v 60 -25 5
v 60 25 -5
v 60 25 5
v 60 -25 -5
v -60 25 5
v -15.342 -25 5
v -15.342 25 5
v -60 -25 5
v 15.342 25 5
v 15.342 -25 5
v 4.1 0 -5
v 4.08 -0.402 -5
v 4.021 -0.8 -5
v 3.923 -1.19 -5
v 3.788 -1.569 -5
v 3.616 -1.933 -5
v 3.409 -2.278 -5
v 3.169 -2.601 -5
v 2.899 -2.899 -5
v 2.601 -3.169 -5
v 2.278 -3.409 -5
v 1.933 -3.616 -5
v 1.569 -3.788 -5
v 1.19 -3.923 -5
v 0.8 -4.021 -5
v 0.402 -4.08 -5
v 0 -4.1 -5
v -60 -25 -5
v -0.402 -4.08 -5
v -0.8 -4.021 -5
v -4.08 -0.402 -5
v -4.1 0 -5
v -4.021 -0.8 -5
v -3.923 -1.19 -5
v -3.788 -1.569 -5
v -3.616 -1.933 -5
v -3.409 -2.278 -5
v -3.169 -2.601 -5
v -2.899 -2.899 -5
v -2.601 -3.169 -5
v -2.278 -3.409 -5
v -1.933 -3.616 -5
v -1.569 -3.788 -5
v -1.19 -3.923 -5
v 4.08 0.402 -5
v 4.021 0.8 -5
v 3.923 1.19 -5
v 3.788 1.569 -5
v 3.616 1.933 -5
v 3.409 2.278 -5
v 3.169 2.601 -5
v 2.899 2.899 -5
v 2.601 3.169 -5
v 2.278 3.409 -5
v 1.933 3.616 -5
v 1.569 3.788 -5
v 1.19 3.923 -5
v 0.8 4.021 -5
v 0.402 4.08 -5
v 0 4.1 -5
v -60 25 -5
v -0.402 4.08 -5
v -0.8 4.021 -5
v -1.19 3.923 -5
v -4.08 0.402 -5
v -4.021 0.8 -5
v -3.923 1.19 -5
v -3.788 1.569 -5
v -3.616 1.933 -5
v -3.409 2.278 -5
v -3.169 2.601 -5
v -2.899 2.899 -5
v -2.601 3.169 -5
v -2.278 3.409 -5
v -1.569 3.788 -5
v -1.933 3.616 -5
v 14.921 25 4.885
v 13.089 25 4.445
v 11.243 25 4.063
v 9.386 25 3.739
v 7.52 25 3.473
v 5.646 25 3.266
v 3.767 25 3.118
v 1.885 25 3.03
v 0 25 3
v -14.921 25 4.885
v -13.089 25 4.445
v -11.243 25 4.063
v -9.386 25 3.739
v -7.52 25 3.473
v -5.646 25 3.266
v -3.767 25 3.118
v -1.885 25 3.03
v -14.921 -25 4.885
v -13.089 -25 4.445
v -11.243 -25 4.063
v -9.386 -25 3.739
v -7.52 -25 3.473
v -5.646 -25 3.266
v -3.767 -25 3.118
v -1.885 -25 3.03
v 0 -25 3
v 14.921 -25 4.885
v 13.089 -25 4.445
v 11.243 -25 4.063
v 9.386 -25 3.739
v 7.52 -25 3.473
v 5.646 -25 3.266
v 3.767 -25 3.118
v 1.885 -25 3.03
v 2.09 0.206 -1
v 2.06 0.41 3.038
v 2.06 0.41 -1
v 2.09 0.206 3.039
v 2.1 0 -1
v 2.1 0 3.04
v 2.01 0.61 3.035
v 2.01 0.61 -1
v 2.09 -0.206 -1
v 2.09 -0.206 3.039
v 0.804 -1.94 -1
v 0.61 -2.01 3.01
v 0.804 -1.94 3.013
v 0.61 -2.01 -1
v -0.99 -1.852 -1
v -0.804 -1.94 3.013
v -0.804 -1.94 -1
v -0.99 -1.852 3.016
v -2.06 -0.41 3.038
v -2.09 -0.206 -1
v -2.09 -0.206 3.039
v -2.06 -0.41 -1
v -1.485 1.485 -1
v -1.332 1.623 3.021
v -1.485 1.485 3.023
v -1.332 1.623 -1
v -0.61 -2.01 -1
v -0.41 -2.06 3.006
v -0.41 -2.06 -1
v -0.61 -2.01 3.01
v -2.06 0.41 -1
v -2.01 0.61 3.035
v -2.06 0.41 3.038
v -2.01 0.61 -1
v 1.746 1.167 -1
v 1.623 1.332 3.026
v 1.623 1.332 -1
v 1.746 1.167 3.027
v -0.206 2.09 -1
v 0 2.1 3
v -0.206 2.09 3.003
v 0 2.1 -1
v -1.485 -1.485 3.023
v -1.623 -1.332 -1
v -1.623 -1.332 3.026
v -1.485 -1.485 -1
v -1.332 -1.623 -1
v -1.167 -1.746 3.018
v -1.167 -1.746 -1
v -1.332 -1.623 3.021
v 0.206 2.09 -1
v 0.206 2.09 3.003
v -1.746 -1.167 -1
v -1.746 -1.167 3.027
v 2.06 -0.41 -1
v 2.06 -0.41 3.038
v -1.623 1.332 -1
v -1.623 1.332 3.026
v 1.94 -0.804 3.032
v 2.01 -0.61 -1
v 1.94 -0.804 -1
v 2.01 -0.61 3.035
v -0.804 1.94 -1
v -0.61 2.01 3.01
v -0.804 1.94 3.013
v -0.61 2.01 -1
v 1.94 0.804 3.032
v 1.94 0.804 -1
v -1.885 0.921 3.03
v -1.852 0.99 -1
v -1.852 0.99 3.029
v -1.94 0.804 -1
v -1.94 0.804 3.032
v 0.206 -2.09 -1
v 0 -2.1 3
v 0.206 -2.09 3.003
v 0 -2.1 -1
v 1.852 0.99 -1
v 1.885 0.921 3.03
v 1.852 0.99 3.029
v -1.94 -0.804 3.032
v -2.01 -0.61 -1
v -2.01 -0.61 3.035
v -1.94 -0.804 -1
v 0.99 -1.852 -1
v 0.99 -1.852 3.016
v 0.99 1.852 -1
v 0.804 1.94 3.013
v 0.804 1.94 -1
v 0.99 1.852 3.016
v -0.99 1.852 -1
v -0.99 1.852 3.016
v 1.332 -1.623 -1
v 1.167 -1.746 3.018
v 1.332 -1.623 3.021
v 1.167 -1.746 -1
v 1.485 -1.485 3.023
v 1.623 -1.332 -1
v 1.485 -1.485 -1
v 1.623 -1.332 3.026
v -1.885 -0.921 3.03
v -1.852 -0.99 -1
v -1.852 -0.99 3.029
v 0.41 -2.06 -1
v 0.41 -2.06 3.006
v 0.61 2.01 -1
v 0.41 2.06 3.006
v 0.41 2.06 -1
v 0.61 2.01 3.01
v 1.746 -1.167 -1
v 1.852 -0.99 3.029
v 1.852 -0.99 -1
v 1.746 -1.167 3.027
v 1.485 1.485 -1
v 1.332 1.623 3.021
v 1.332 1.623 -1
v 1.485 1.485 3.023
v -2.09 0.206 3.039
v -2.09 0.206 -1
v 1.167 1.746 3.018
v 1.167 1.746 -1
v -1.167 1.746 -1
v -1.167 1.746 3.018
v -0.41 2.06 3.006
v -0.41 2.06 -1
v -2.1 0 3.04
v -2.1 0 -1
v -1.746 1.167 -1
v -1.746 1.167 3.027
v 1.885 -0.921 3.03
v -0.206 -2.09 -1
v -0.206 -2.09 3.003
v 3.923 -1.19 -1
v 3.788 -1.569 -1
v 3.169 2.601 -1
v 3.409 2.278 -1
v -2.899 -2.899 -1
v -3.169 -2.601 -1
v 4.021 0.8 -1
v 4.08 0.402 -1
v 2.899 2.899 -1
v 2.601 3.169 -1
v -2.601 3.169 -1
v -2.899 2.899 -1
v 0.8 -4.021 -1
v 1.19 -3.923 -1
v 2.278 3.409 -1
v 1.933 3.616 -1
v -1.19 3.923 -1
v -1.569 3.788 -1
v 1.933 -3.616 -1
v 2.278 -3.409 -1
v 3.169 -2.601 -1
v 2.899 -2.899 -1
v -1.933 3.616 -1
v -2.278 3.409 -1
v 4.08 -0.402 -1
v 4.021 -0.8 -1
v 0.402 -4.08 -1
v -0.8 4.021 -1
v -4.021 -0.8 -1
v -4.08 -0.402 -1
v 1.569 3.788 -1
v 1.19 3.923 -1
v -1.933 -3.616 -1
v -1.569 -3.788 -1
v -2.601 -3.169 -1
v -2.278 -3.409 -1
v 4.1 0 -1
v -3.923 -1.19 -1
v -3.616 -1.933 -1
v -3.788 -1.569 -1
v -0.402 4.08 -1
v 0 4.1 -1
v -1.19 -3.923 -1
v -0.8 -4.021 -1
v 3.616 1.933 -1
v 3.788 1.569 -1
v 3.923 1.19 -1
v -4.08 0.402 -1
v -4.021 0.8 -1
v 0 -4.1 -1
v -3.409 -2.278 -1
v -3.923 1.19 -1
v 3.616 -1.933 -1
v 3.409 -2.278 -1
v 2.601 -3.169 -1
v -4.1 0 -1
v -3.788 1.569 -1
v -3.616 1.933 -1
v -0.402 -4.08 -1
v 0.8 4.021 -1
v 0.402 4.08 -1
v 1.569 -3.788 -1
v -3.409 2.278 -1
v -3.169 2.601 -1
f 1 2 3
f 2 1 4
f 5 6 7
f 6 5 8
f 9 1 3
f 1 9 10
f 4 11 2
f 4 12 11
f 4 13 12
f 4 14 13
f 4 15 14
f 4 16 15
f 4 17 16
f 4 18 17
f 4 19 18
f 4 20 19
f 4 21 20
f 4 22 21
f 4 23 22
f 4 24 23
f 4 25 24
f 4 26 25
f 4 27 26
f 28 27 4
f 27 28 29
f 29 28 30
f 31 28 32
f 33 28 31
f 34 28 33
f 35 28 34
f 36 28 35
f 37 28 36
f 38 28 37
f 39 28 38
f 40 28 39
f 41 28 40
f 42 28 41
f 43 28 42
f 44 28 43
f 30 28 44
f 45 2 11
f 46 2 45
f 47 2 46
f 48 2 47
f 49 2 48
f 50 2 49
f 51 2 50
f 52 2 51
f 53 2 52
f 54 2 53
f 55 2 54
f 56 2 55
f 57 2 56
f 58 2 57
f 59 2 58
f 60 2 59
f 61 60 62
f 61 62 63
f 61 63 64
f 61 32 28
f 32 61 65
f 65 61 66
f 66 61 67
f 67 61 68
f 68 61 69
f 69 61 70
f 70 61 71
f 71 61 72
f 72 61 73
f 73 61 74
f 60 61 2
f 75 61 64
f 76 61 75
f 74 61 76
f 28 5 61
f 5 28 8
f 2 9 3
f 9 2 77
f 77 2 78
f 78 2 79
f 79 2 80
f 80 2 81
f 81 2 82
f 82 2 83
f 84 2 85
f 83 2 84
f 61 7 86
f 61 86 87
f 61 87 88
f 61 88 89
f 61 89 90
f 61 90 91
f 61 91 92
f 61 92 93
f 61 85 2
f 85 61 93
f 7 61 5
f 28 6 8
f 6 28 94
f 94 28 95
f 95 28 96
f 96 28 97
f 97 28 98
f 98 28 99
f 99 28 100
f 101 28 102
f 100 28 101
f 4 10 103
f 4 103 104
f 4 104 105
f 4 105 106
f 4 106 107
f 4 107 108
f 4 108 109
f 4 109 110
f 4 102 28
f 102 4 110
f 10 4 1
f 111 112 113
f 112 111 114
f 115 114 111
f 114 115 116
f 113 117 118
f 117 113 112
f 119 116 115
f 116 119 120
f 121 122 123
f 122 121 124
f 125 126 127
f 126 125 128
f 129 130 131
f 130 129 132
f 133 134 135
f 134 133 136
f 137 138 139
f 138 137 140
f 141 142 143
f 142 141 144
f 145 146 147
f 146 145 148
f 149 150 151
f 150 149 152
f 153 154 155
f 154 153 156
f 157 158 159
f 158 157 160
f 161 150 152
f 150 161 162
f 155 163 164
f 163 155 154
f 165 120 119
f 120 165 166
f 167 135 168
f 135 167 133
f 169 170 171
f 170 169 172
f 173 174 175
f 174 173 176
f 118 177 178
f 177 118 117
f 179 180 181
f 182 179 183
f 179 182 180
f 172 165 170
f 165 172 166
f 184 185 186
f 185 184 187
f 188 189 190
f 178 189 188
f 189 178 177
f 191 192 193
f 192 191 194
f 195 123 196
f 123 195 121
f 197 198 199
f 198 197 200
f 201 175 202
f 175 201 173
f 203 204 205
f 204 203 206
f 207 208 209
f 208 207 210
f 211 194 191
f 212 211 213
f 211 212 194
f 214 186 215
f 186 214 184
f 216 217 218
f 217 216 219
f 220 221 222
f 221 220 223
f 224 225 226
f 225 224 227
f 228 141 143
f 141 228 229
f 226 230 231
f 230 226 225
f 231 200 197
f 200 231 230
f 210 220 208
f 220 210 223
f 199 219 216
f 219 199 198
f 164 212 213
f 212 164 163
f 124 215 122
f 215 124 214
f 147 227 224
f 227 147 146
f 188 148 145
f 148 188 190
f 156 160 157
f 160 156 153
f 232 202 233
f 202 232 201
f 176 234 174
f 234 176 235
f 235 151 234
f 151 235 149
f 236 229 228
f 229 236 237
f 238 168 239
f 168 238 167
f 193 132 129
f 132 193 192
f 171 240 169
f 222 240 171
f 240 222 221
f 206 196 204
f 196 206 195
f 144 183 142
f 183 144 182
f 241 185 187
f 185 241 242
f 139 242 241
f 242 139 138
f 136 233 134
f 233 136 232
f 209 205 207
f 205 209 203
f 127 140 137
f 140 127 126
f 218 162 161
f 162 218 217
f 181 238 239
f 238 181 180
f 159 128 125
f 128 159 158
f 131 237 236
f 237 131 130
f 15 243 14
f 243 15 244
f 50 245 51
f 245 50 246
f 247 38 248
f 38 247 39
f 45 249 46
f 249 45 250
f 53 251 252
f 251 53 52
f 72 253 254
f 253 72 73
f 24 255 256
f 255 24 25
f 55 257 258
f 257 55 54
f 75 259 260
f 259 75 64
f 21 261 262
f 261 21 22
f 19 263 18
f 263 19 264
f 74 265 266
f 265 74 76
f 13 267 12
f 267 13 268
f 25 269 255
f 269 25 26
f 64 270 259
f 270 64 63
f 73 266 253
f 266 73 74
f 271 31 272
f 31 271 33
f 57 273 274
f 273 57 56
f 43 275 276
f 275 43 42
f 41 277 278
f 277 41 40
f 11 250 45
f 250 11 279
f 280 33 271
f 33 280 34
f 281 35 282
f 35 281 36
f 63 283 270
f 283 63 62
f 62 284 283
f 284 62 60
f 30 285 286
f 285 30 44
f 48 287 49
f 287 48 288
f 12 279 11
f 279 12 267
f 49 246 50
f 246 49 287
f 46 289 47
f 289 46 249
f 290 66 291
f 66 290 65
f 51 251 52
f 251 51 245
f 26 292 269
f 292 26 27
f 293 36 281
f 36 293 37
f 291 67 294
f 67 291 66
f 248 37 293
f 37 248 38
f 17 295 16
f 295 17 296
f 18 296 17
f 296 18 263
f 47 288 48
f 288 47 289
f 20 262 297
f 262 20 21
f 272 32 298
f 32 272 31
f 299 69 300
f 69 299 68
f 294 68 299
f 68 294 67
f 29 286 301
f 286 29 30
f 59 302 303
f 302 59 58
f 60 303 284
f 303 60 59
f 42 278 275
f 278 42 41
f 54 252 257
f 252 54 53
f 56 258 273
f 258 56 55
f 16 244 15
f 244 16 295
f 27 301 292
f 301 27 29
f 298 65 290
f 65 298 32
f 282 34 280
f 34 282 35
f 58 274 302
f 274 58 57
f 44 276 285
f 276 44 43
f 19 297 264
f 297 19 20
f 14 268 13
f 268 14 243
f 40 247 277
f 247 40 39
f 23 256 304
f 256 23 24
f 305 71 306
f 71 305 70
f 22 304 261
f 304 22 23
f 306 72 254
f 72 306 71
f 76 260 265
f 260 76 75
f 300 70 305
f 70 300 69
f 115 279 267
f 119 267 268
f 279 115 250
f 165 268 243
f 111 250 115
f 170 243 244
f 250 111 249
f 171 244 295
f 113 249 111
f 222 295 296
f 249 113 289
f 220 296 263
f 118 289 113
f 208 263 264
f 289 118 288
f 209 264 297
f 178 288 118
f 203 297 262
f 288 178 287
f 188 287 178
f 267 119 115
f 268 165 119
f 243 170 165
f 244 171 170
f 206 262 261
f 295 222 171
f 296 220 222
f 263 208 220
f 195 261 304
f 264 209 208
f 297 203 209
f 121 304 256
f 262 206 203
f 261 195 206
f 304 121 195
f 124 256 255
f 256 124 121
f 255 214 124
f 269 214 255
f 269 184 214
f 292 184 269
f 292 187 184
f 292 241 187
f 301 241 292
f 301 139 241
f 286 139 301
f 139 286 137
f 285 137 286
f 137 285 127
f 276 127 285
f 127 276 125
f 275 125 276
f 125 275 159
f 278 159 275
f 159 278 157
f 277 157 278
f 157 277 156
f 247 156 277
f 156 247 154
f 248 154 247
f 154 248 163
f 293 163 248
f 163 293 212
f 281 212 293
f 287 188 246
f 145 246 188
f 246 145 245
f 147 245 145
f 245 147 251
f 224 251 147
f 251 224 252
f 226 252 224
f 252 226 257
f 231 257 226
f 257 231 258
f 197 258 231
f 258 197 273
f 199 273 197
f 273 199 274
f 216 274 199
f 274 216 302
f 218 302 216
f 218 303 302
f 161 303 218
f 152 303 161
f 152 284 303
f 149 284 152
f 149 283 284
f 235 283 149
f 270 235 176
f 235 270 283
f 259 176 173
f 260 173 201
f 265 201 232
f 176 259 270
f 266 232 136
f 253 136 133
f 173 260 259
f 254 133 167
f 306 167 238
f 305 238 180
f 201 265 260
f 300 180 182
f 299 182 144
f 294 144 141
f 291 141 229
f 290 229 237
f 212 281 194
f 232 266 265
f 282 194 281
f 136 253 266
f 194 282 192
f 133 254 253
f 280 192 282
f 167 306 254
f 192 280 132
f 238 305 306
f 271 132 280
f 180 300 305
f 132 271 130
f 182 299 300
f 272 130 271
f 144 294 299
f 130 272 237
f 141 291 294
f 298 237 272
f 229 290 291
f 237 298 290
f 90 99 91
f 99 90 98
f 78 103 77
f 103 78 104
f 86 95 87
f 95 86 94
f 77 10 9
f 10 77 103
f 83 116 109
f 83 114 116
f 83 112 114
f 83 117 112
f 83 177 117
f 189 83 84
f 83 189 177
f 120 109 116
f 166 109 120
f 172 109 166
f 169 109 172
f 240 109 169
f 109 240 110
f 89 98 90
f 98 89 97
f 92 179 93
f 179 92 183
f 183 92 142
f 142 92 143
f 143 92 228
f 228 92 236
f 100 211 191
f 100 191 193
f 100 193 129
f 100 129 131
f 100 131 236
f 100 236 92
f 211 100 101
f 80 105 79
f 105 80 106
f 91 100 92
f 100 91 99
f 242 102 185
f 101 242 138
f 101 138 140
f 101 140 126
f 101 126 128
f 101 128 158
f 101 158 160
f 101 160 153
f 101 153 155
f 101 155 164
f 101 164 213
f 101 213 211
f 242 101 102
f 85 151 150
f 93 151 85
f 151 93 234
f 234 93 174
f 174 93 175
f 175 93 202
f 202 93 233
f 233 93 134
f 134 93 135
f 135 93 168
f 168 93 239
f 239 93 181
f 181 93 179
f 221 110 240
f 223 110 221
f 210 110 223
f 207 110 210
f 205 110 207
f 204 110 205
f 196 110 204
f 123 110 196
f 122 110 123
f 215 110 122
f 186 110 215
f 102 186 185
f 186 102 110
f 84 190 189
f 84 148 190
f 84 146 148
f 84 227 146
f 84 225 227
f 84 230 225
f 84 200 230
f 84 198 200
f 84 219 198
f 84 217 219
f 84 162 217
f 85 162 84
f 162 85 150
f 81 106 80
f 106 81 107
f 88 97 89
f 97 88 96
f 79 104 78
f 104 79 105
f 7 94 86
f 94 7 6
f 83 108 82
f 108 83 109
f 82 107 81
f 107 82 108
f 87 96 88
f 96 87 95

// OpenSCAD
// Clock Base

$fn=64;

difference() {
cube([120,50,10], center=true);

//4mm bolt hole
cylinder(h=12,d=4.2, center=true);

// Bolt head
translate([0,0,-6]) cylinder(h=5,d=8.2);
    
// Clock body
translate([0,27,63])
  rotate([90,0,0])
  cylinder(h=54,d=120, $fn=200);
}
